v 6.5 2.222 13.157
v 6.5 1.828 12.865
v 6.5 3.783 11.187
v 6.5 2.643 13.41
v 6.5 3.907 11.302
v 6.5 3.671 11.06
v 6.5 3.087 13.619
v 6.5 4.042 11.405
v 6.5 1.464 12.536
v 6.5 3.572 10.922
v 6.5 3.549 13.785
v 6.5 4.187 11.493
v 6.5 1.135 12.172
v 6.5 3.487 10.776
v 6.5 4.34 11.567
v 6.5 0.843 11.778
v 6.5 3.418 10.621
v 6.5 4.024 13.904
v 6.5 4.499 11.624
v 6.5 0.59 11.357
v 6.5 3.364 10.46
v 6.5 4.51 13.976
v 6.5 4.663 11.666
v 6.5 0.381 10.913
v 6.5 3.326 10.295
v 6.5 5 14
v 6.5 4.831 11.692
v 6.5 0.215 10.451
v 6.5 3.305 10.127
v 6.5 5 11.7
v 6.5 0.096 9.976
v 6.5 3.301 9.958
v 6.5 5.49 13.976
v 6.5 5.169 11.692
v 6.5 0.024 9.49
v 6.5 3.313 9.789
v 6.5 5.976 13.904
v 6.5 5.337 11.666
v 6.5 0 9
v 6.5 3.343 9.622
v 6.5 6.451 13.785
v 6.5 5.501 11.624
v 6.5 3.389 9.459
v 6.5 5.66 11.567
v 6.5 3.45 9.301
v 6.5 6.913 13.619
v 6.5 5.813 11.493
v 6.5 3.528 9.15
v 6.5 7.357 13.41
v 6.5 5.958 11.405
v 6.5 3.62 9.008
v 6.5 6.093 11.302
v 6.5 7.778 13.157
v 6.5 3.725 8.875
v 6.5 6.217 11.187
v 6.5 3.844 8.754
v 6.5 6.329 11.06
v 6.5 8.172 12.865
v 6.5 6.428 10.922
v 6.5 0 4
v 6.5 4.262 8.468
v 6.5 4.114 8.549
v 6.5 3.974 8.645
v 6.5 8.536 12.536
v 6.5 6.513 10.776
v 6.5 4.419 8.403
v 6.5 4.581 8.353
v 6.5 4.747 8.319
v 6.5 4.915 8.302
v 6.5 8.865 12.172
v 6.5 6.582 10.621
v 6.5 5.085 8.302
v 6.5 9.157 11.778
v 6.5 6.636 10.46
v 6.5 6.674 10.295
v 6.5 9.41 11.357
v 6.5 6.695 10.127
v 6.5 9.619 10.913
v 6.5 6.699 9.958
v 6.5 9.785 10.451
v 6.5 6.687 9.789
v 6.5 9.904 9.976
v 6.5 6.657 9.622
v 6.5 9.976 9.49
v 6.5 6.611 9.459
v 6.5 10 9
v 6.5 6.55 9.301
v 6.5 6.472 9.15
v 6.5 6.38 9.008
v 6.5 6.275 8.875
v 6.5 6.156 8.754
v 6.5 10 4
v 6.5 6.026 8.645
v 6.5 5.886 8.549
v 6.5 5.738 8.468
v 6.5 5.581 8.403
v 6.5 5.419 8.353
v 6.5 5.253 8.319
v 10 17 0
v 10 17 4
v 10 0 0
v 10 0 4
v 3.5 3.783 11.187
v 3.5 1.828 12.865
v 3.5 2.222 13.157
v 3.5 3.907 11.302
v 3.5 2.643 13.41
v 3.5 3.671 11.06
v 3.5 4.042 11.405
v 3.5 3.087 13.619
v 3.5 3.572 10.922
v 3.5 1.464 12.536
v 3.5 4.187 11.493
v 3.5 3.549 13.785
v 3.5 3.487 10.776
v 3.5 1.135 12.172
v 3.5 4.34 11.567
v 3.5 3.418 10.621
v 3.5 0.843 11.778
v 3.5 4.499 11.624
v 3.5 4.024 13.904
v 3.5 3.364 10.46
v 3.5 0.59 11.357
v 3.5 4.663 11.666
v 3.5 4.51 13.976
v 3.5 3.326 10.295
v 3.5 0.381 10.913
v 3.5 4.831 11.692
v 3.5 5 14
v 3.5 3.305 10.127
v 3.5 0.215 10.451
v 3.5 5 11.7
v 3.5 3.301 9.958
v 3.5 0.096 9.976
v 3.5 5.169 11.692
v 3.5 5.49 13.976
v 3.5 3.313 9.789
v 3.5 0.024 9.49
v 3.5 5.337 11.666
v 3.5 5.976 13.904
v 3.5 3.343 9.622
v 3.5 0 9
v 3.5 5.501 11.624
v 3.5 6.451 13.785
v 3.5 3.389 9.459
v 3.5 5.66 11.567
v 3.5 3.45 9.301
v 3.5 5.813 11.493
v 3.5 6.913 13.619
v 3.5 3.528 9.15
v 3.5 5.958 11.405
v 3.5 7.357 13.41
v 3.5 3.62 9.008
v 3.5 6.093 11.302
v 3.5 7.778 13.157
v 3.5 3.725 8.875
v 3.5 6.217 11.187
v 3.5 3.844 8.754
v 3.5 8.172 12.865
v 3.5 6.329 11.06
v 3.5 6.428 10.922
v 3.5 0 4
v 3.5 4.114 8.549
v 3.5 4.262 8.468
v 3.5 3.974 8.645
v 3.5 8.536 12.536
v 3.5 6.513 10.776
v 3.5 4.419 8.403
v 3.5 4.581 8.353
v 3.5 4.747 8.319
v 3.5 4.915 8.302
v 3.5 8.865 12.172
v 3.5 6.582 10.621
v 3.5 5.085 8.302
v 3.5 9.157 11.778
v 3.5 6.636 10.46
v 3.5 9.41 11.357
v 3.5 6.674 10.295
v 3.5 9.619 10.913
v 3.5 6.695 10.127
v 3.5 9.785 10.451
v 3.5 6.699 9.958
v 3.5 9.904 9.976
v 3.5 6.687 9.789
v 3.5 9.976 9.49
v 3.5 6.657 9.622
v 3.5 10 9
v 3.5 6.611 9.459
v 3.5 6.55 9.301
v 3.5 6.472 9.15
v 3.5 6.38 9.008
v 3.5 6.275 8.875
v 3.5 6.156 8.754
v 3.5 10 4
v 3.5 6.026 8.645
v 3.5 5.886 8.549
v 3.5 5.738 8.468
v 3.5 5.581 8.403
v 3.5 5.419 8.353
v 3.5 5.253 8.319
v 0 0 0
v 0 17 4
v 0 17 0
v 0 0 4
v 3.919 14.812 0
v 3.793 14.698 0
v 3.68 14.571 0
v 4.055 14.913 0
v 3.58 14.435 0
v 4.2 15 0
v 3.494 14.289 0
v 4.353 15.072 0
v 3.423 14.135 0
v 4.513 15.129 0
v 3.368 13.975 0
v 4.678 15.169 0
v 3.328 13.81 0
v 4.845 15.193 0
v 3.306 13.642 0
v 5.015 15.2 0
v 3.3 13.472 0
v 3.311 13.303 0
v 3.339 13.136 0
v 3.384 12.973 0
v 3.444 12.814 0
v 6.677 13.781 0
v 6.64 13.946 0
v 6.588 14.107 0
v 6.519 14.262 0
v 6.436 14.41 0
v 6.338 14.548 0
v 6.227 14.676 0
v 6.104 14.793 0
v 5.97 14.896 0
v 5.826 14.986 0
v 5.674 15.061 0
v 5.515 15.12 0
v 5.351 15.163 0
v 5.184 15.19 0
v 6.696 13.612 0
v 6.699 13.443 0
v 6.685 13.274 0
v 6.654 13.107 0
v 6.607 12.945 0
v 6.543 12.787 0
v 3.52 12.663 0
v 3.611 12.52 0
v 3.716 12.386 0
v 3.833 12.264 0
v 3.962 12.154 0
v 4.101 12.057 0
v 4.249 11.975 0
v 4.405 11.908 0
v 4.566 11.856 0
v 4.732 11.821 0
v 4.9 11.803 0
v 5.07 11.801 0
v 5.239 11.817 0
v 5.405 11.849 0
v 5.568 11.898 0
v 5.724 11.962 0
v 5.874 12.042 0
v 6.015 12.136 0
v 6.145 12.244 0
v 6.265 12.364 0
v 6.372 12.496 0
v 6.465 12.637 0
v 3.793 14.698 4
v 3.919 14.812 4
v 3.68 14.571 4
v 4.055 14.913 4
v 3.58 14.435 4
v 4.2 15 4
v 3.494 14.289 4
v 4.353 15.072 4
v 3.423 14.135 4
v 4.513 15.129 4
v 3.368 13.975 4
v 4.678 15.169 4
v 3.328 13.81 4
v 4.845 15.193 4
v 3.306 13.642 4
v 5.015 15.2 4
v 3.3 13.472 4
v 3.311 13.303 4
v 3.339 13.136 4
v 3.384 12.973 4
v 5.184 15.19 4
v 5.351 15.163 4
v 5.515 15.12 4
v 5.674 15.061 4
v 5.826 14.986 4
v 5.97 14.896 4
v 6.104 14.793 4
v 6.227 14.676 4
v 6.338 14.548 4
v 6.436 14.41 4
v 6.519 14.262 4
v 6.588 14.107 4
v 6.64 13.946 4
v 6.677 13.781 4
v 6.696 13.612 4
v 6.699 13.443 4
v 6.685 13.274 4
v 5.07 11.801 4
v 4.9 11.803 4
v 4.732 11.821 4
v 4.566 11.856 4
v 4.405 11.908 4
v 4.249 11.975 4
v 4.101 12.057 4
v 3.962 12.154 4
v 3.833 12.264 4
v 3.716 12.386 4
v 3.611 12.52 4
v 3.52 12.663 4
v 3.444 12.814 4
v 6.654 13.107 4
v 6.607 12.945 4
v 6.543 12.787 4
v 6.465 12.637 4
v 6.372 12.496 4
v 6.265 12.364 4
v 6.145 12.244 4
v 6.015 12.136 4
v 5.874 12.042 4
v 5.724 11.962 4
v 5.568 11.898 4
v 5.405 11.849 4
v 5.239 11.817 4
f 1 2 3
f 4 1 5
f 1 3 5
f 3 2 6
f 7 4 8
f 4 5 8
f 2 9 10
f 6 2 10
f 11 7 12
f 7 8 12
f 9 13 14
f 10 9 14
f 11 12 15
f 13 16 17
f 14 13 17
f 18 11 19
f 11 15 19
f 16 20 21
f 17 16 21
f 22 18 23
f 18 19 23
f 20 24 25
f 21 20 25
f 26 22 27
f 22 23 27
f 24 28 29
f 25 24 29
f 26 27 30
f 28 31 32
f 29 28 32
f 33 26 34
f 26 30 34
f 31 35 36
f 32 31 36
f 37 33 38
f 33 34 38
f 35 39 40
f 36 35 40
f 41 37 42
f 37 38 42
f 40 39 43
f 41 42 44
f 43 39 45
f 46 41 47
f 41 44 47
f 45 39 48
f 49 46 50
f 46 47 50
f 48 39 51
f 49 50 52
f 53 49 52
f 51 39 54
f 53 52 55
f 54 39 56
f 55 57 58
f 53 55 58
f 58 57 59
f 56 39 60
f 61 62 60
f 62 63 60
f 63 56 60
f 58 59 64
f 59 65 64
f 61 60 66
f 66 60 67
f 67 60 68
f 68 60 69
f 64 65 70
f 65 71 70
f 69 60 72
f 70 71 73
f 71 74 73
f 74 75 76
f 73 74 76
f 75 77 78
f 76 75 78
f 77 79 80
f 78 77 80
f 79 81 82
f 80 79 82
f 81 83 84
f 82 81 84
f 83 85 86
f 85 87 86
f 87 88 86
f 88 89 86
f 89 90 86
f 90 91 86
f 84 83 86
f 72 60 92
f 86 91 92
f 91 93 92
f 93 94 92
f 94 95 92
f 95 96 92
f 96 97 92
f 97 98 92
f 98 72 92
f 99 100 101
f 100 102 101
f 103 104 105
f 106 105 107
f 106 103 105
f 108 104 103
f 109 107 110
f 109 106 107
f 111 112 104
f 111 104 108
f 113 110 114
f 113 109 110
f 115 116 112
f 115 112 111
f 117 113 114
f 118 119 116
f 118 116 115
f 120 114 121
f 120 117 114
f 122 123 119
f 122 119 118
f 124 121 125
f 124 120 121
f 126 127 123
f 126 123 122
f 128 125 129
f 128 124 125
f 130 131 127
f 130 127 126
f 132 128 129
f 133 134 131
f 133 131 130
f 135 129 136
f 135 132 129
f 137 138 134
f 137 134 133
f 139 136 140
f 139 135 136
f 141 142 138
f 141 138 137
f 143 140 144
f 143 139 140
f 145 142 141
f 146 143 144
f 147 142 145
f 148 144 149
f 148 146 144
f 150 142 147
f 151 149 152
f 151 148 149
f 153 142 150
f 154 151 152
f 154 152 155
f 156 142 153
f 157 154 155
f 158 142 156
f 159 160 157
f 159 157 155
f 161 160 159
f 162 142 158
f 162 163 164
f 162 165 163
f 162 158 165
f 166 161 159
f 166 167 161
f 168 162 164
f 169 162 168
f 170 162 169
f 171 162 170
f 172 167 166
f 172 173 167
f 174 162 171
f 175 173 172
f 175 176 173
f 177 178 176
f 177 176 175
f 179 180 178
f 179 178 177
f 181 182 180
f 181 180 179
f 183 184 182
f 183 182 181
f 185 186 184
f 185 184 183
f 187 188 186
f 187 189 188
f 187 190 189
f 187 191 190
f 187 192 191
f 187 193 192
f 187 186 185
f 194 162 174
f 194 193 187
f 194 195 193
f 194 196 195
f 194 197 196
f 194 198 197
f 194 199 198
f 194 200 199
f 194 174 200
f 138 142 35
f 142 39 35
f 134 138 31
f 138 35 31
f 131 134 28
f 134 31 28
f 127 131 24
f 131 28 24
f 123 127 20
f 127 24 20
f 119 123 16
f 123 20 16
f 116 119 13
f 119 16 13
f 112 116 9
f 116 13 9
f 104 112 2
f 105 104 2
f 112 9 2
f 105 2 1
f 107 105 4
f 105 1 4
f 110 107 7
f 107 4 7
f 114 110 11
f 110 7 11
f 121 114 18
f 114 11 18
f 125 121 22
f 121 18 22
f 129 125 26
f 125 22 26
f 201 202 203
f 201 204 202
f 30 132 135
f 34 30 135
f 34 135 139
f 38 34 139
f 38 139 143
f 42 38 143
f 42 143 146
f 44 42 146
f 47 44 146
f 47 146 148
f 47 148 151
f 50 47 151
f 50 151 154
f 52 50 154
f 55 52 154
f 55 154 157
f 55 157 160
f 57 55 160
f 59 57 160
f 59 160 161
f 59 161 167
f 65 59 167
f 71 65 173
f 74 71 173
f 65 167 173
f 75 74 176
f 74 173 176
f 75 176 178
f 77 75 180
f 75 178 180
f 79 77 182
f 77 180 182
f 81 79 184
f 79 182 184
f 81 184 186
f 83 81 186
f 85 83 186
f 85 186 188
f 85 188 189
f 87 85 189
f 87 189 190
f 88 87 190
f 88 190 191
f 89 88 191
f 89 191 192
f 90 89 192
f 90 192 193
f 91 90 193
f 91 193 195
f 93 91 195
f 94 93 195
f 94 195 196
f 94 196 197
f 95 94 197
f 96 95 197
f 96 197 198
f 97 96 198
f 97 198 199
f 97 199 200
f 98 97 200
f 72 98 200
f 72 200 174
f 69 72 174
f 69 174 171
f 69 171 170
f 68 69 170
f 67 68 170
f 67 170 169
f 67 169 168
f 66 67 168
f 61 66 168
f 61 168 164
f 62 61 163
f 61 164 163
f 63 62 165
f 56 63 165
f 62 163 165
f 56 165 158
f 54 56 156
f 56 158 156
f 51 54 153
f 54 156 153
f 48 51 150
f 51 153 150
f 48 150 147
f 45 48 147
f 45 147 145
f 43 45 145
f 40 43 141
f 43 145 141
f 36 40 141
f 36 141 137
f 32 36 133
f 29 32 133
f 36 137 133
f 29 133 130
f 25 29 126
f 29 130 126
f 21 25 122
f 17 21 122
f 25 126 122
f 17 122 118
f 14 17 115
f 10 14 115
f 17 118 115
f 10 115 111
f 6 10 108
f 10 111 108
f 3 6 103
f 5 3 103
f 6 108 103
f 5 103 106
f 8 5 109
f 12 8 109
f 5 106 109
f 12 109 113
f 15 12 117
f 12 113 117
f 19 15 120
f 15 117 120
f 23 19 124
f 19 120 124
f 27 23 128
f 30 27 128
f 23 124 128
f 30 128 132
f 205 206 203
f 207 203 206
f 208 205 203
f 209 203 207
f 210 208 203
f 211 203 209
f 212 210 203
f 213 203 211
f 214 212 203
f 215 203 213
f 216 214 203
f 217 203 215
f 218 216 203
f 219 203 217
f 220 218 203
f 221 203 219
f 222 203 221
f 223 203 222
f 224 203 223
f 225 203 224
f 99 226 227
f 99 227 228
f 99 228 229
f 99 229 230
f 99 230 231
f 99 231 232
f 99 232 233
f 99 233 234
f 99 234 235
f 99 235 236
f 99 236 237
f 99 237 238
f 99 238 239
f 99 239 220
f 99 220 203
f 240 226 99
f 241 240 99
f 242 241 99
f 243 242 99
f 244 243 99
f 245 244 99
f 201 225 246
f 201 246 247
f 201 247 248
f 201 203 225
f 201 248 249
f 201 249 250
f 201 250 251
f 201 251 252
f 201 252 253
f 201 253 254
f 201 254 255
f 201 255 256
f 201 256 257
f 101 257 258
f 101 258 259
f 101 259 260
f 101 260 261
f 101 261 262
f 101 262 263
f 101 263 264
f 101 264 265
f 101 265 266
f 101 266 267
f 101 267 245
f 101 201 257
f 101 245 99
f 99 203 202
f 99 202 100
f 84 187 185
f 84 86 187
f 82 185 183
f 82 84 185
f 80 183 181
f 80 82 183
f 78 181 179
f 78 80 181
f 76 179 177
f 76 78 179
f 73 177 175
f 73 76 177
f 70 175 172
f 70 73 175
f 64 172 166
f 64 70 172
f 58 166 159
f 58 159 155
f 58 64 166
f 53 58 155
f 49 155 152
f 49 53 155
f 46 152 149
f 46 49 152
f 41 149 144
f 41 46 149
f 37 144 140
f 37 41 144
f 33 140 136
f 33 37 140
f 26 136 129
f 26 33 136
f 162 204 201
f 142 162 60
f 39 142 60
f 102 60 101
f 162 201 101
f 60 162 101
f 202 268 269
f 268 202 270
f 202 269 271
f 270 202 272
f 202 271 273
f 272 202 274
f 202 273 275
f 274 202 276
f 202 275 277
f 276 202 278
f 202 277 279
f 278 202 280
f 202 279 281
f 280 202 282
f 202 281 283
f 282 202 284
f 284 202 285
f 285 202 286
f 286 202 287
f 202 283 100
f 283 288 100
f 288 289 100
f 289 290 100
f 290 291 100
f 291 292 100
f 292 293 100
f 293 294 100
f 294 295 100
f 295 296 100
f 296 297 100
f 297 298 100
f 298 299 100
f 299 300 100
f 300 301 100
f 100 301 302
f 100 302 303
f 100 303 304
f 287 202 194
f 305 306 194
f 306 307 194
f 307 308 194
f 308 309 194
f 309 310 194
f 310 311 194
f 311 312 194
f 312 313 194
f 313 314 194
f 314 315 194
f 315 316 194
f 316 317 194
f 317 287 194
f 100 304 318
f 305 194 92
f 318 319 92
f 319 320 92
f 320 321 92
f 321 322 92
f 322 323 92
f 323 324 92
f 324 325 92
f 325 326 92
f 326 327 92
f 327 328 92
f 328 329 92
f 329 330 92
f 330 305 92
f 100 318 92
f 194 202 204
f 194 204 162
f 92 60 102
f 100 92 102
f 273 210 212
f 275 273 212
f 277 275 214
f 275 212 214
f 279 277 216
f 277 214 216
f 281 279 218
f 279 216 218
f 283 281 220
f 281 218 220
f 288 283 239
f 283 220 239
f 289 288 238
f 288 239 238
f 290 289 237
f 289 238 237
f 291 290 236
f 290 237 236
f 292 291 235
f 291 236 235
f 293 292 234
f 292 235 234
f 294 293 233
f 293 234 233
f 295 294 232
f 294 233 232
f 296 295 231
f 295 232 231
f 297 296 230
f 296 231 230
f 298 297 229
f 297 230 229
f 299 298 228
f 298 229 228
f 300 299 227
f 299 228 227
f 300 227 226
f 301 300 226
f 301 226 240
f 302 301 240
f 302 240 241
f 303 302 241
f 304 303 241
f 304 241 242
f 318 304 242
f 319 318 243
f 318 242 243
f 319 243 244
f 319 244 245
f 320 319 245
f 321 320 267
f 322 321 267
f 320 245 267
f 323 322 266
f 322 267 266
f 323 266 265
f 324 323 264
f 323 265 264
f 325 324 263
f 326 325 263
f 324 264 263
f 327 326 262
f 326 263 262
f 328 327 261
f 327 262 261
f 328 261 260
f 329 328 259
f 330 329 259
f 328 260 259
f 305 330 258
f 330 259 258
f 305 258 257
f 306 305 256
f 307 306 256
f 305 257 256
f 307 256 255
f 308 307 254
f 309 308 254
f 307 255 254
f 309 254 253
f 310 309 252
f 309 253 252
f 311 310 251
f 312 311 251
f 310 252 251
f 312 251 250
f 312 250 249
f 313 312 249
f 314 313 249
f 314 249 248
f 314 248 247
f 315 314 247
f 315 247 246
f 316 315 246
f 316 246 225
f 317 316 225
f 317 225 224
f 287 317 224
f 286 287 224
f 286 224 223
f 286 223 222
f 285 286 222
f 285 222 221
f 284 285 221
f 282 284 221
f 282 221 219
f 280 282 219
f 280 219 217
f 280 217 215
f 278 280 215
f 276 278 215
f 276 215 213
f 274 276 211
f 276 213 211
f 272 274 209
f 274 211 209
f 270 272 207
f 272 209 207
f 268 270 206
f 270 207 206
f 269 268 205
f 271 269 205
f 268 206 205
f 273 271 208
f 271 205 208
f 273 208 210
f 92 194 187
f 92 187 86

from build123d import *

# Parameters (mm, degrees)
SKETCH1_W                = 3
SKETCH1_H                = 10
BOSS_EXTRUDE1_DEPTH      = 4
SKETCH2_W                = 3
SKETCH2_H                = 10
BOSS_EXTRUDE2_DEPTH      = 10
FILLET1_R                = 5
M3_CLEARANCE_HOLE1_D     = 3.4
M3_CLEARANCE_HOLE1_DEPTH = 70
M3_CLEARANCE_HOLE1_TIP   = 1.021463052
SKETCH6_W                = 10
SKETCH6_H                = 4
BOSS_EXTRUDE3_DEPTH      = 2
M3_CLEARANCE_HOLE2_D     = 3.4
M3_CLEARANCE_HOLE2_DEPTH = 70
M3_CLEARANCE_HOLE2_TIP   = 1.021463052
M3_CLEARANCE_HOLE3_D     = 3.4
M3_CLEARANCE_HOLE3_DEPTH = 70
M3_CLEARANCE_HOLE3_TIP   = 1.021463052


with BuildPart() as part:
    # Sketch1 → Boss-Extrude1 (new body)
    with BuildSketch(Plane.XY):
        Polygon((0, 15), (0, 0), (3.241791175, 0), (3.241791175, 10), (6.241791175, 10), (6.241791175, 0), (10, 0), (10, 15), align=None)
        with Locations((4.741791175, 5)):
            Rectangle(SKETCH1_W, SKETCH1_H)
    extrude(amount=BOSS_EXTRUDE1_DEPTH)

    # Sketch2 → Boss-Extrude2 (add)
    with BuildSketch(Plane.XY.offset(4)):
        with Locations((5, 5)):
            Rectangle(SKETCH2_W, SKETCH2_H)
    extrude(amount=BOSS_EXTRUDE2_DEPTH)

    # Fillet1
    fillet1_edges = [part.edges().sort_by_distance(p)[0] for p in [
        (5, 0, 14),
        (5, 10, 14),
    ]]
    fillet(fillet1_edges, radius=FILLET1_R - 0.0001)  # a hair under: the kernel refuses the full size

    # M3 Clearance Hole1
    with Locations(Plane.XY.offset(4)):
        with Locations((5, 13.5), (12.547675822, 14.055863144)):
            Hole(M3_CLEARANCE_HOLE1_D / 2, depth=M3_CLEARANCE_HOLE1_DEPTH)
            with Locations((0, 0, -(M3_CLEARANCE_HOLE1_DEPTH + M3_CLEARANCE_HOLE1_TIP / 2))):  # 118° drill point
                Cone(0, M3_CLEARANCE_HOLE1_D / 2, M3_CLEARANCE_HOLE1_TIP, mode=Mode.SUBTRACT)

    # Sketch6 → Boss-Extrude3 (add)
    with BuildSketch(Plane(origin=(0, 15, 0), x_dir=(1, 0, 0), z_dir=(0, 1, 0))):
        with Locations((5, -2)):
            Rectangle(SKETCH6_W, SKETCH6_H)
    extrude(amount=BOSS_EXTRUDE3_DEPTH)

    # M3 Clearance Hole2
    with Locations(Plane.XY.offset(4)):
        with Locations((5, 13.5)):
            Hole(M3_CLEARANCE_HOLE2_D / 2, depth=M3_CLEARANCE_HOLE2_DEPTH)
            with Locations((0, 0, -(M3_CLEARANCE_HOLE2_DEPTH + M3_CLEARANCE_HOLE2_TIP / 2))):  # 118° drill point
                Cone(0, M3_CLEARANCE_HOLE2_D / 2, M3_CLEARANCE_HOLE2_TIP, mode=Mode.SUBTRACT)

    # M3 Clearance Hole3
    with Locations(Plane(origin=(6.5, 0, 0), x_dir=(0, 0, -1), z_dir=(1, 0, 0))):
        with Locations((-10, 5)):
            Hole(M3_CLEARANCE_HOLE3_D / 2, depth=M3_CLEARANCE_HOLE3_DEPTH)
            with Locations((0, 0, -(M3_CLEARANCE_HOLE3_DEPTH + M3_CLEARANCE_HOLE3_TIP / 2))):  # 118° drill point
                Cone(0, M3_CLEARANCE_HOLE3_D / 2, M3_CLEARANCE_HOLE3_TIP, mode=Mode.SUBTRACT)


solid = part.part
